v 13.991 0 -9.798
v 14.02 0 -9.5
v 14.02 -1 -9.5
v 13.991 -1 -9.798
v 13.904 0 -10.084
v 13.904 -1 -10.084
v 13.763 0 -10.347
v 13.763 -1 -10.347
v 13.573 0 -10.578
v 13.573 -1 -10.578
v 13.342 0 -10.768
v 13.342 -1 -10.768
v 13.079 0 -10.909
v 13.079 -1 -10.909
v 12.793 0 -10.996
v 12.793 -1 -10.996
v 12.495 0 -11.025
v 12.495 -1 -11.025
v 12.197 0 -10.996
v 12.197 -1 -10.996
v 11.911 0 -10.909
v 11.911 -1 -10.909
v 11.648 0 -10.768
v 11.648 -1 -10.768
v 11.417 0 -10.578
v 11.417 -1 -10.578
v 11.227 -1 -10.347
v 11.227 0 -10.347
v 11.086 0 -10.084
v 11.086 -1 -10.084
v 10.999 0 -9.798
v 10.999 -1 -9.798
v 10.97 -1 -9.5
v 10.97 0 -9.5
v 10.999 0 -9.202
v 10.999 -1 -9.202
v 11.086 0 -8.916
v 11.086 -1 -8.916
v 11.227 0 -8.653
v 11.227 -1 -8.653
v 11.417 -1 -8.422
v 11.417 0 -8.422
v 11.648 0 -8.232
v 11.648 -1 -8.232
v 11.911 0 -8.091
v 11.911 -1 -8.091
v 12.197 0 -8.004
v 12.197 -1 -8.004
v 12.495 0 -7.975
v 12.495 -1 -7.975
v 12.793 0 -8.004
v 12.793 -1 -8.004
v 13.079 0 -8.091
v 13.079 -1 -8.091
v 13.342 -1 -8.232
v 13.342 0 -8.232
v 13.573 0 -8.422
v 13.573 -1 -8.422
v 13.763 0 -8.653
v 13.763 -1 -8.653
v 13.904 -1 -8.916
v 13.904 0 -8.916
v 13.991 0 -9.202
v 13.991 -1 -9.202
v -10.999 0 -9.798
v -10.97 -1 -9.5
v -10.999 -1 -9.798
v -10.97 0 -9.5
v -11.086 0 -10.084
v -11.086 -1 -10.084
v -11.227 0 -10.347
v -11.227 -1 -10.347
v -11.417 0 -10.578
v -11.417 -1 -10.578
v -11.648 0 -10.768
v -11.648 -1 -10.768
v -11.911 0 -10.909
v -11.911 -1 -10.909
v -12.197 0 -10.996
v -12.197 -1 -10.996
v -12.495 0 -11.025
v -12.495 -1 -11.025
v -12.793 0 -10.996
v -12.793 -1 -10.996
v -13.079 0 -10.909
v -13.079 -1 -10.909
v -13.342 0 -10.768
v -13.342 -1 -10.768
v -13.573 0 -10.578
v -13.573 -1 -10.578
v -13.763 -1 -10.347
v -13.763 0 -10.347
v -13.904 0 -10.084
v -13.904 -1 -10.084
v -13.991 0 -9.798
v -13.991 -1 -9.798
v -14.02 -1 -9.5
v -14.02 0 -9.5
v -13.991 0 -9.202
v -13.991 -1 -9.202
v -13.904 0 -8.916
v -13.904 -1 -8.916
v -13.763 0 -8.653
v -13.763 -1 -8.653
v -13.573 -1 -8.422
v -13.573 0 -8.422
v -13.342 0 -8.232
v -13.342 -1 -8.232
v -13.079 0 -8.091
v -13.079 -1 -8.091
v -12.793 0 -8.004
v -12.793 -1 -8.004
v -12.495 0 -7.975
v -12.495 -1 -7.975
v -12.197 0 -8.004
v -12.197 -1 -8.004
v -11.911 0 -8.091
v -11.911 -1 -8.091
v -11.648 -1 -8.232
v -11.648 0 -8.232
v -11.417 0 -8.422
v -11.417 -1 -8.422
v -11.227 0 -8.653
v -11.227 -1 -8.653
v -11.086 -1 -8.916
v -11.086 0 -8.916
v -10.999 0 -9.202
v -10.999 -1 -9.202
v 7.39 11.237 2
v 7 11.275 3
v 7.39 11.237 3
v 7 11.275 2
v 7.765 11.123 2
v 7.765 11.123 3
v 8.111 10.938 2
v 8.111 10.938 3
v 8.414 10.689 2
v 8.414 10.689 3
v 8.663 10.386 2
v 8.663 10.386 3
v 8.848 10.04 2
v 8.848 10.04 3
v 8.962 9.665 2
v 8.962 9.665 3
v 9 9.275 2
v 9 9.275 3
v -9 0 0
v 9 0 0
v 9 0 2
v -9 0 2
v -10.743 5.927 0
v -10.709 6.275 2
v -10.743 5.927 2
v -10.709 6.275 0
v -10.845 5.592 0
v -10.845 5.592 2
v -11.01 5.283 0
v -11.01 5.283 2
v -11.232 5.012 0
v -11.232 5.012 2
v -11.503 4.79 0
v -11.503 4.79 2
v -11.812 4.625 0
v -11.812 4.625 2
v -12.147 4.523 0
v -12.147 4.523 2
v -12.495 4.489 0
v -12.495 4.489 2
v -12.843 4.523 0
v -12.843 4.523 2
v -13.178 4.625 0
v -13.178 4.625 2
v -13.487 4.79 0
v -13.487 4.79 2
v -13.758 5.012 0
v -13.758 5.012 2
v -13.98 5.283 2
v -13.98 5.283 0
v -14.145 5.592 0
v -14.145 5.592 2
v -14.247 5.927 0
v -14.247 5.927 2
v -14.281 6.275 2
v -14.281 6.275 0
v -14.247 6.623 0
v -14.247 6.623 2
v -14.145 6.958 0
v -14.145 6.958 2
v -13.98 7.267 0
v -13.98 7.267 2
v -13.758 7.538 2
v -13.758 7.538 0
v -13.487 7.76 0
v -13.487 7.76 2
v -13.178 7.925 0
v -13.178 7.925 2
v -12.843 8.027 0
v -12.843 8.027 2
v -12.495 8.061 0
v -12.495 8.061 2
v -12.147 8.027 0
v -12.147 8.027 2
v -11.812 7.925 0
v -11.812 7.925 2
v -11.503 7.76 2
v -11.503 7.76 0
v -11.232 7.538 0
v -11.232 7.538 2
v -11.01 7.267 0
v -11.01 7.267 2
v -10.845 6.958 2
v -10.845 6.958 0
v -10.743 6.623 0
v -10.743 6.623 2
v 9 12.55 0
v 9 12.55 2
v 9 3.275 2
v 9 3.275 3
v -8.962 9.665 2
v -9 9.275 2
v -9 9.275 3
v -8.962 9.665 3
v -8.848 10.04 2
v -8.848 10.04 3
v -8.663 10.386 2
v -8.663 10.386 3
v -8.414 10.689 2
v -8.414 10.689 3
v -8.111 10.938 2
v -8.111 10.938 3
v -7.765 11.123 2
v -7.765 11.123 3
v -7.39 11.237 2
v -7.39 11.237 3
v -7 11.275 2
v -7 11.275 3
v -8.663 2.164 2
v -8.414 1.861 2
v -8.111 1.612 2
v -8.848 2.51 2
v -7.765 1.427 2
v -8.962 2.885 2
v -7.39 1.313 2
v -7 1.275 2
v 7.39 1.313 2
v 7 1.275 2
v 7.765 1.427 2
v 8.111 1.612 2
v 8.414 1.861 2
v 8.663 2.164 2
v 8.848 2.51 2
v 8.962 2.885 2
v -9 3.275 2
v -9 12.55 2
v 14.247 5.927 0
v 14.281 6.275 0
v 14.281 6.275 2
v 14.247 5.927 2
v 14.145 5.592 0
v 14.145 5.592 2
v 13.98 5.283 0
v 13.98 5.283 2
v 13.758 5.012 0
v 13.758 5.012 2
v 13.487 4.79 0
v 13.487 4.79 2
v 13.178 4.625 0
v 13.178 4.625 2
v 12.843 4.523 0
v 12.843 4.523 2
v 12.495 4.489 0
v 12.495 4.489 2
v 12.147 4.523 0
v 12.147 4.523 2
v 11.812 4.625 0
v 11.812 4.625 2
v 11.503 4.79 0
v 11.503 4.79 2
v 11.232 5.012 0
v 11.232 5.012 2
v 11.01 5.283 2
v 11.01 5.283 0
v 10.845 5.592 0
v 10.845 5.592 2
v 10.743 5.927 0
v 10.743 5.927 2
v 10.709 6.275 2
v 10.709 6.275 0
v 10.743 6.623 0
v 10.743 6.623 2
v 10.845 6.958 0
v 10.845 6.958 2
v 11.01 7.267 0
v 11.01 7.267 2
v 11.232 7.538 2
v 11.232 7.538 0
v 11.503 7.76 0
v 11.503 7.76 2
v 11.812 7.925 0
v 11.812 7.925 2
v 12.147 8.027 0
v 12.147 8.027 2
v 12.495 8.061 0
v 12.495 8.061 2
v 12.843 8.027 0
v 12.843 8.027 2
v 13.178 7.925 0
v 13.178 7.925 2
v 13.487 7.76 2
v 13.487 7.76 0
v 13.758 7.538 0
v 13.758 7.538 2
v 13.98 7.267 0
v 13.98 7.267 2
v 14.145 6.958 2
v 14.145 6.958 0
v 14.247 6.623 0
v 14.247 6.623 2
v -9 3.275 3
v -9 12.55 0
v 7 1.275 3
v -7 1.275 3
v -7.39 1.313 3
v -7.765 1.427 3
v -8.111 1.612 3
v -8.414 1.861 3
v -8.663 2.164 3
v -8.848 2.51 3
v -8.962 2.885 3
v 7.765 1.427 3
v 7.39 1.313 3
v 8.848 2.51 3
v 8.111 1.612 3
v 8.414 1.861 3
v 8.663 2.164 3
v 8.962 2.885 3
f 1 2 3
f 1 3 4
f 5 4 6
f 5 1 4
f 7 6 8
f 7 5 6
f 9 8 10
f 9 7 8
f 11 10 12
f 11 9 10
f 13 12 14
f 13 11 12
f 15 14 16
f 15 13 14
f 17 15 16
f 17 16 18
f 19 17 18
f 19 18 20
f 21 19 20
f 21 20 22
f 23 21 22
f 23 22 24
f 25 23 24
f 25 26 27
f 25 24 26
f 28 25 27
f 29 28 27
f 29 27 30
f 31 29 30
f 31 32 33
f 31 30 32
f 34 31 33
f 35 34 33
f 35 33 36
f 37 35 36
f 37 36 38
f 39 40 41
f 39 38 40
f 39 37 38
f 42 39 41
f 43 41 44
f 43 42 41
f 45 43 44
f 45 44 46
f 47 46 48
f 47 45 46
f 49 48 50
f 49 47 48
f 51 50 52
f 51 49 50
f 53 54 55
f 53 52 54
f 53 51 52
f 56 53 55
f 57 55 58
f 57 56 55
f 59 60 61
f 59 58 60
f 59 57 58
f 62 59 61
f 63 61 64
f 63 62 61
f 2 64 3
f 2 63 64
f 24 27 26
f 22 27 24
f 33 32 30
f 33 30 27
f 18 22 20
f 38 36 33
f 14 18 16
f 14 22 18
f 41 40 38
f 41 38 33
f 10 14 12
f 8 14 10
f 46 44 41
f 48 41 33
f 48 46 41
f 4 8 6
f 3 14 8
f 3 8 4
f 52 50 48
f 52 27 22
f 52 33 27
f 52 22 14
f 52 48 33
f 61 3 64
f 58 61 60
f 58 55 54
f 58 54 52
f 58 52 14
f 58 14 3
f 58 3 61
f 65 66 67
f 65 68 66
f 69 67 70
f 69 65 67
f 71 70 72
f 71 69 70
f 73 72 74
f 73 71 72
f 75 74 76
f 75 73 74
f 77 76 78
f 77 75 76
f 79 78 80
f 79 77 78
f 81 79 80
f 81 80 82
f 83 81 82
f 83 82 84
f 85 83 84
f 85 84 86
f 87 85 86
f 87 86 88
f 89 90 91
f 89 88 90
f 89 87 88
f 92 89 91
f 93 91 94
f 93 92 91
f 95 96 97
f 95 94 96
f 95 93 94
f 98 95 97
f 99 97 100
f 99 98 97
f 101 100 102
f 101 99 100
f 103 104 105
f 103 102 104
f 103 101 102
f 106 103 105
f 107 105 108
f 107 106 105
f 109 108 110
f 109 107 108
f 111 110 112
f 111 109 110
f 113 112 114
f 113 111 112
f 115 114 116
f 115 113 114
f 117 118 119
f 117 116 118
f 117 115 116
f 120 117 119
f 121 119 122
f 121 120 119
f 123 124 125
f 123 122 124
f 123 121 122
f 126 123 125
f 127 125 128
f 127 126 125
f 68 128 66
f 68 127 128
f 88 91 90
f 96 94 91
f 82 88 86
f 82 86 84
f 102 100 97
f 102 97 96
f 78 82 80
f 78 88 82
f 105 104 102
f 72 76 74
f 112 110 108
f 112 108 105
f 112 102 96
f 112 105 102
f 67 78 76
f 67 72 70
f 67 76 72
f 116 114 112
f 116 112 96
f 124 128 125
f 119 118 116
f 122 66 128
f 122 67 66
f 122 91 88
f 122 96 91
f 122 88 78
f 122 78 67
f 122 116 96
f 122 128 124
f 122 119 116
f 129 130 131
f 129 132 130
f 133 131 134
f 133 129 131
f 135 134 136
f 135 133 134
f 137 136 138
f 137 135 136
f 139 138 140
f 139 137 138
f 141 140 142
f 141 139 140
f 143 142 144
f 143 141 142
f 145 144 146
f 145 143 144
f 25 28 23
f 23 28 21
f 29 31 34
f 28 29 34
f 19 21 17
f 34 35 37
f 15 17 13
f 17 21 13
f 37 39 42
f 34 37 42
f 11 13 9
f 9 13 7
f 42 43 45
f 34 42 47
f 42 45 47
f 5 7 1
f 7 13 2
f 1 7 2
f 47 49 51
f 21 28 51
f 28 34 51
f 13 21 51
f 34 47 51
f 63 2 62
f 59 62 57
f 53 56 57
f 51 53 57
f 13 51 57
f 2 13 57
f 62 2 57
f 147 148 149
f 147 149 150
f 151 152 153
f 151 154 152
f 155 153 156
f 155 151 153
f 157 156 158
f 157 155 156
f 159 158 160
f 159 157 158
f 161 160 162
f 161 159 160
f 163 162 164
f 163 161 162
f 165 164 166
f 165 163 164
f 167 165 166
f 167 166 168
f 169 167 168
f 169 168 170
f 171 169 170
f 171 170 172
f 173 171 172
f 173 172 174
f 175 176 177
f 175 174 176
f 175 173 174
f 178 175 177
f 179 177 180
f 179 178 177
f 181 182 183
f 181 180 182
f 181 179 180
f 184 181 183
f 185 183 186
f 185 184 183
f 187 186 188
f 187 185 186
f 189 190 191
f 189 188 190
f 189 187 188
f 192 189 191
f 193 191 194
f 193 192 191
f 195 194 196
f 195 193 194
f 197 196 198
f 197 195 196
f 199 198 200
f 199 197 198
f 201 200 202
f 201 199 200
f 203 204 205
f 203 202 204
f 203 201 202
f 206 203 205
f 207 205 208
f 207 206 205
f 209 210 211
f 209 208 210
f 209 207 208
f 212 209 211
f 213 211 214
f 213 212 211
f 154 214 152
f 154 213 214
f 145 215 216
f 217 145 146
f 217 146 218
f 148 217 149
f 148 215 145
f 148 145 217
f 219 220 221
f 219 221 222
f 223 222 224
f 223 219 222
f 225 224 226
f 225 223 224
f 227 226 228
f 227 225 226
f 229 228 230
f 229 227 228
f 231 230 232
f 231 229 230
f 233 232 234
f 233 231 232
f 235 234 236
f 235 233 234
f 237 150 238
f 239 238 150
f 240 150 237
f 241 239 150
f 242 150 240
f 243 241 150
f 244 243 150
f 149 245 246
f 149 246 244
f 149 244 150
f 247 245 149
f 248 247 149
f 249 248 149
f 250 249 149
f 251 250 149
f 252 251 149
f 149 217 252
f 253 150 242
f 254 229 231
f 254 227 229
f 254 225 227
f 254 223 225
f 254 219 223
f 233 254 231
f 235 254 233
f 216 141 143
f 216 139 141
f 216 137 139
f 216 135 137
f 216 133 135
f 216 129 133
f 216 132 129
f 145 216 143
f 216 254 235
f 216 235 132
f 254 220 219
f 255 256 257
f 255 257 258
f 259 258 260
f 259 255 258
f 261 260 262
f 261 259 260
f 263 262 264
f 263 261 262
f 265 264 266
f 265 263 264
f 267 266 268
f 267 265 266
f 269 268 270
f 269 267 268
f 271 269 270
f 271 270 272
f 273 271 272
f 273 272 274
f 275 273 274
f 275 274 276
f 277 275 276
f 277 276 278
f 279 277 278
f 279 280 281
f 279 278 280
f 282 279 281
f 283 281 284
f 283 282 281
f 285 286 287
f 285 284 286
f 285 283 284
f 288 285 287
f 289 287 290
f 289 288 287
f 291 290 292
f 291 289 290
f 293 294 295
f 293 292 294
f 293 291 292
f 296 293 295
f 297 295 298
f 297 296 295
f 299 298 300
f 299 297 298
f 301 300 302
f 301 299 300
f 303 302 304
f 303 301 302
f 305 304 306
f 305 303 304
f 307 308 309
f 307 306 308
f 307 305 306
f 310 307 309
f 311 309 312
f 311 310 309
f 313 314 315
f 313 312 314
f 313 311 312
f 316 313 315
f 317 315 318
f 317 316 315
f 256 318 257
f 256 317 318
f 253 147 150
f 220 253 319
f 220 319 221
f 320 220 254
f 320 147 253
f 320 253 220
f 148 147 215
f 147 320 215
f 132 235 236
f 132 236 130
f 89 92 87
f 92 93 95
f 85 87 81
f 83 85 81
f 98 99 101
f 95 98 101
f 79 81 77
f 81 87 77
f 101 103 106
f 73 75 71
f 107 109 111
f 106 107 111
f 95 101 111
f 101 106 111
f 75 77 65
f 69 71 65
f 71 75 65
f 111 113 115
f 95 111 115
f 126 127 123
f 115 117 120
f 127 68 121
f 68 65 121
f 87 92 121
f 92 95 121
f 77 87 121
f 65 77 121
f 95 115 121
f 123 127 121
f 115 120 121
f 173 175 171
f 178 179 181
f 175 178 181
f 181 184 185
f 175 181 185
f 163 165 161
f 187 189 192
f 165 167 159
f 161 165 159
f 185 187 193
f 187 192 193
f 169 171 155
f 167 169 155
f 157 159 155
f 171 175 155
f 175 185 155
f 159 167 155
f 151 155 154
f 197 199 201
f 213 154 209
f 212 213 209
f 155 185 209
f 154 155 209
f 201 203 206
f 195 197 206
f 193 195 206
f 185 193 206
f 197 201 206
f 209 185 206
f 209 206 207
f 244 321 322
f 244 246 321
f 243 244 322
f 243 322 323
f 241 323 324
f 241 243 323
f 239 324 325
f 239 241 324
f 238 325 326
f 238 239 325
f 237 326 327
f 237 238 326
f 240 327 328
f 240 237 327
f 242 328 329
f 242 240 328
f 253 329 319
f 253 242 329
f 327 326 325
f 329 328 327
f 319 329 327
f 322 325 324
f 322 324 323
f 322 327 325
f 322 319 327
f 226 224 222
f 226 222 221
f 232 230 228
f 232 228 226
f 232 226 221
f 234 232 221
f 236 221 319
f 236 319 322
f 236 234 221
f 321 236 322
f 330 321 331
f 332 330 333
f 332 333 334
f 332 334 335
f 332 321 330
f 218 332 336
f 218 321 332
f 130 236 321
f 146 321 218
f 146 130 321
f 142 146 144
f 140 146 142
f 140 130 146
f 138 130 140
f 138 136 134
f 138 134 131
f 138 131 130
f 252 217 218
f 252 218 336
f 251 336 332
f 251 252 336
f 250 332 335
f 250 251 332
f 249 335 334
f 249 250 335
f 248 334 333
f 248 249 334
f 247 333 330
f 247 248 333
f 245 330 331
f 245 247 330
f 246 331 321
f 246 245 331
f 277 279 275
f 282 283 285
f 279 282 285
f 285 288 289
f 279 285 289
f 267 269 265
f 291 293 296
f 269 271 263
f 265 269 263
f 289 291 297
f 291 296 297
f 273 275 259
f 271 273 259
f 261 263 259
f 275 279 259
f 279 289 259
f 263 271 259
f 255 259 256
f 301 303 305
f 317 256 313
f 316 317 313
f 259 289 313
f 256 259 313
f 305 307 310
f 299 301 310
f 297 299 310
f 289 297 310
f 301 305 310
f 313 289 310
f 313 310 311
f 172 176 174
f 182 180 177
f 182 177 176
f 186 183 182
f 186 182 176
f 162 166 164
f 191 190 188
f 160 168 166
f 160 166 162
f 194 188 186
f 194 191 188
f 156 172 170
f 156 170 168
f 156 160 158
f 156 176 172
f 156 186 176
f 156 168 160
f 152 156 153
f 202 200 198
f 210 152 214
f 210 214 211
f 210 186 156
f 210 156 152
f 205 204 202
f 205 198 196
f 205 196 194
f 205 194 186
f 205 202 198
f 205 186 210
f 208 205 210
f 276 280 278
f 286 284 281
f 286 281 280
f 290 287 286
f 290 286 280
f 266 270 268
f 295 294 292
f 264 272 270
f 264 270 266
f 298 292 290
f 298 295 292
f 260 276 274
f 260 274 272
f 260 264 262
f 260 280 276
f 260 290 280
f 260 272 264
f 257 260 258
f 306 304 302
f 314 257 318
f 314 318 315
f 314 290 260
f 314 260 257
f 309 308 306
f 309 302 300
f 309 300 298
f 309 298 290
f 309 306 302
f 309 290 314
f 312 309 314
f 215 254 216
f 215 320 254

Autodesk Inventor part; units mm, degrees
ref_plane "XZ Plane" through (0, 0, 0) normal (0, 1, 0) x (-1, 0, 0)
ref_plane "XY Plane" through (0, 0, 0) normal (0, 0, 1) x (1, 0, 0)
sketch "Sketch1" plane through (0, 0, 0) normal (0, 0, 1) x (1, 0, 0)
  line L0 (-9, 12.55) -> (9, 12.55)
  line L1 (9, 12.55) -> (9, 0)
  line L2 (9, 0) -> (-9, 0)
  line L3 (-9, 0) -> (-9, 12.55)
  circle A0 centre (-12.495, 6.275) radius 1.7859
  circle A1 centre (12.495, 6.275) radius 1.7859
  point P0 (0, 0)
  dimension "d0" = 18
  dimension "d1" = 12.55
  dimension "d2" = 9
  dimension "d3" = 0
  dimension "d14" = 24.99
  dimension "d15" = 12.495
  dimension "d16" = 6.275
  dimension "d17" = 6.275
  dimension "d18" = 3.5719
  dimension "d19" = 3.5719
extrude "Extrusion1" add sketch "Sketch1" along normal blind 2
sketch "Sketch2" plane through (-9, 0, 0) normal (0, -1, 0) x (1, 0, 0)
  line L0 (18, 0) -> (0, 0) projected
  circle A0 centre (-3.495, -9.5) radius 1.525
  circle A1 centre (21.495, -9.5) radius 1.525
  point P0 (9, 0)
  dimension "d6" = 3.05
  dimension "d7" = 3.05
  dimension "d8" = 24.99
  dimension "d9" = 12.495
  dimension "d10" = 9.5
  dimension "d11" = 9.5
extrude "Extrusion2" add sketch "Sketch2" along normal blind 1
sketch "Sketch3" plane through (0, 0, 2) normal (0, 0, 1) x (1, 0, 0)
  line L0 (9, 12.55) -> (9, 0) projected
  line L1 (-9, 0) -> (-9, 12.55) projected
  line L2 (9, 0) -> (-9, 0) projected
  line L3 (-7, 11.275) -> (7, 11.275)
  line L4 (9, 9.275) -> (9, 3.275)
  line L5 (7, 1.275) -> (-7, 1.275)
  line L6 (-9, 3.275) -> (-9, 9.275)
  arc A0 (-7, 11.275) -> (-9, 9.275) centre (-7, 9.275) ccw
  arc A1 (9, 9.275) -> (7, 11.275) centre (7, 9.275) ccw
  arc A2 (7, 1.275) -> (9, 3.275) centre (7, 3.275) ccw
  arc A3 (-9, 3.275) -> (-7, 1.275) centre (-7, 3.275) ccw
  point P0 (0, 0)
  point P1 (-9, 11.275)
  point P2 (9, 1.275)
  point P3 (9, 11.275)
  dimension "d20" = 10
  dimension "d21" = 1.275
  dimension "d22" = 12.55
  dimension "d23" = 2
extrude "Extrusion3" add sketch "Sketch3" along normal blind 1 contours L0 A2 L5 A3 L1 A0 L3 A1
equation "\"d2\" = 0.5 * d0"
equation "\"d15\" = 0.5 * d14"
equation "\"d16\" = 0.5 * d1"
equation "\"d17\" = d16"
equation "\"d9\" = 0.5 * d8"
equation "\"d21\" = -0.5 * d20 + 0.5 * d22"
properties part number "DB9 connector 2017_06_14"
